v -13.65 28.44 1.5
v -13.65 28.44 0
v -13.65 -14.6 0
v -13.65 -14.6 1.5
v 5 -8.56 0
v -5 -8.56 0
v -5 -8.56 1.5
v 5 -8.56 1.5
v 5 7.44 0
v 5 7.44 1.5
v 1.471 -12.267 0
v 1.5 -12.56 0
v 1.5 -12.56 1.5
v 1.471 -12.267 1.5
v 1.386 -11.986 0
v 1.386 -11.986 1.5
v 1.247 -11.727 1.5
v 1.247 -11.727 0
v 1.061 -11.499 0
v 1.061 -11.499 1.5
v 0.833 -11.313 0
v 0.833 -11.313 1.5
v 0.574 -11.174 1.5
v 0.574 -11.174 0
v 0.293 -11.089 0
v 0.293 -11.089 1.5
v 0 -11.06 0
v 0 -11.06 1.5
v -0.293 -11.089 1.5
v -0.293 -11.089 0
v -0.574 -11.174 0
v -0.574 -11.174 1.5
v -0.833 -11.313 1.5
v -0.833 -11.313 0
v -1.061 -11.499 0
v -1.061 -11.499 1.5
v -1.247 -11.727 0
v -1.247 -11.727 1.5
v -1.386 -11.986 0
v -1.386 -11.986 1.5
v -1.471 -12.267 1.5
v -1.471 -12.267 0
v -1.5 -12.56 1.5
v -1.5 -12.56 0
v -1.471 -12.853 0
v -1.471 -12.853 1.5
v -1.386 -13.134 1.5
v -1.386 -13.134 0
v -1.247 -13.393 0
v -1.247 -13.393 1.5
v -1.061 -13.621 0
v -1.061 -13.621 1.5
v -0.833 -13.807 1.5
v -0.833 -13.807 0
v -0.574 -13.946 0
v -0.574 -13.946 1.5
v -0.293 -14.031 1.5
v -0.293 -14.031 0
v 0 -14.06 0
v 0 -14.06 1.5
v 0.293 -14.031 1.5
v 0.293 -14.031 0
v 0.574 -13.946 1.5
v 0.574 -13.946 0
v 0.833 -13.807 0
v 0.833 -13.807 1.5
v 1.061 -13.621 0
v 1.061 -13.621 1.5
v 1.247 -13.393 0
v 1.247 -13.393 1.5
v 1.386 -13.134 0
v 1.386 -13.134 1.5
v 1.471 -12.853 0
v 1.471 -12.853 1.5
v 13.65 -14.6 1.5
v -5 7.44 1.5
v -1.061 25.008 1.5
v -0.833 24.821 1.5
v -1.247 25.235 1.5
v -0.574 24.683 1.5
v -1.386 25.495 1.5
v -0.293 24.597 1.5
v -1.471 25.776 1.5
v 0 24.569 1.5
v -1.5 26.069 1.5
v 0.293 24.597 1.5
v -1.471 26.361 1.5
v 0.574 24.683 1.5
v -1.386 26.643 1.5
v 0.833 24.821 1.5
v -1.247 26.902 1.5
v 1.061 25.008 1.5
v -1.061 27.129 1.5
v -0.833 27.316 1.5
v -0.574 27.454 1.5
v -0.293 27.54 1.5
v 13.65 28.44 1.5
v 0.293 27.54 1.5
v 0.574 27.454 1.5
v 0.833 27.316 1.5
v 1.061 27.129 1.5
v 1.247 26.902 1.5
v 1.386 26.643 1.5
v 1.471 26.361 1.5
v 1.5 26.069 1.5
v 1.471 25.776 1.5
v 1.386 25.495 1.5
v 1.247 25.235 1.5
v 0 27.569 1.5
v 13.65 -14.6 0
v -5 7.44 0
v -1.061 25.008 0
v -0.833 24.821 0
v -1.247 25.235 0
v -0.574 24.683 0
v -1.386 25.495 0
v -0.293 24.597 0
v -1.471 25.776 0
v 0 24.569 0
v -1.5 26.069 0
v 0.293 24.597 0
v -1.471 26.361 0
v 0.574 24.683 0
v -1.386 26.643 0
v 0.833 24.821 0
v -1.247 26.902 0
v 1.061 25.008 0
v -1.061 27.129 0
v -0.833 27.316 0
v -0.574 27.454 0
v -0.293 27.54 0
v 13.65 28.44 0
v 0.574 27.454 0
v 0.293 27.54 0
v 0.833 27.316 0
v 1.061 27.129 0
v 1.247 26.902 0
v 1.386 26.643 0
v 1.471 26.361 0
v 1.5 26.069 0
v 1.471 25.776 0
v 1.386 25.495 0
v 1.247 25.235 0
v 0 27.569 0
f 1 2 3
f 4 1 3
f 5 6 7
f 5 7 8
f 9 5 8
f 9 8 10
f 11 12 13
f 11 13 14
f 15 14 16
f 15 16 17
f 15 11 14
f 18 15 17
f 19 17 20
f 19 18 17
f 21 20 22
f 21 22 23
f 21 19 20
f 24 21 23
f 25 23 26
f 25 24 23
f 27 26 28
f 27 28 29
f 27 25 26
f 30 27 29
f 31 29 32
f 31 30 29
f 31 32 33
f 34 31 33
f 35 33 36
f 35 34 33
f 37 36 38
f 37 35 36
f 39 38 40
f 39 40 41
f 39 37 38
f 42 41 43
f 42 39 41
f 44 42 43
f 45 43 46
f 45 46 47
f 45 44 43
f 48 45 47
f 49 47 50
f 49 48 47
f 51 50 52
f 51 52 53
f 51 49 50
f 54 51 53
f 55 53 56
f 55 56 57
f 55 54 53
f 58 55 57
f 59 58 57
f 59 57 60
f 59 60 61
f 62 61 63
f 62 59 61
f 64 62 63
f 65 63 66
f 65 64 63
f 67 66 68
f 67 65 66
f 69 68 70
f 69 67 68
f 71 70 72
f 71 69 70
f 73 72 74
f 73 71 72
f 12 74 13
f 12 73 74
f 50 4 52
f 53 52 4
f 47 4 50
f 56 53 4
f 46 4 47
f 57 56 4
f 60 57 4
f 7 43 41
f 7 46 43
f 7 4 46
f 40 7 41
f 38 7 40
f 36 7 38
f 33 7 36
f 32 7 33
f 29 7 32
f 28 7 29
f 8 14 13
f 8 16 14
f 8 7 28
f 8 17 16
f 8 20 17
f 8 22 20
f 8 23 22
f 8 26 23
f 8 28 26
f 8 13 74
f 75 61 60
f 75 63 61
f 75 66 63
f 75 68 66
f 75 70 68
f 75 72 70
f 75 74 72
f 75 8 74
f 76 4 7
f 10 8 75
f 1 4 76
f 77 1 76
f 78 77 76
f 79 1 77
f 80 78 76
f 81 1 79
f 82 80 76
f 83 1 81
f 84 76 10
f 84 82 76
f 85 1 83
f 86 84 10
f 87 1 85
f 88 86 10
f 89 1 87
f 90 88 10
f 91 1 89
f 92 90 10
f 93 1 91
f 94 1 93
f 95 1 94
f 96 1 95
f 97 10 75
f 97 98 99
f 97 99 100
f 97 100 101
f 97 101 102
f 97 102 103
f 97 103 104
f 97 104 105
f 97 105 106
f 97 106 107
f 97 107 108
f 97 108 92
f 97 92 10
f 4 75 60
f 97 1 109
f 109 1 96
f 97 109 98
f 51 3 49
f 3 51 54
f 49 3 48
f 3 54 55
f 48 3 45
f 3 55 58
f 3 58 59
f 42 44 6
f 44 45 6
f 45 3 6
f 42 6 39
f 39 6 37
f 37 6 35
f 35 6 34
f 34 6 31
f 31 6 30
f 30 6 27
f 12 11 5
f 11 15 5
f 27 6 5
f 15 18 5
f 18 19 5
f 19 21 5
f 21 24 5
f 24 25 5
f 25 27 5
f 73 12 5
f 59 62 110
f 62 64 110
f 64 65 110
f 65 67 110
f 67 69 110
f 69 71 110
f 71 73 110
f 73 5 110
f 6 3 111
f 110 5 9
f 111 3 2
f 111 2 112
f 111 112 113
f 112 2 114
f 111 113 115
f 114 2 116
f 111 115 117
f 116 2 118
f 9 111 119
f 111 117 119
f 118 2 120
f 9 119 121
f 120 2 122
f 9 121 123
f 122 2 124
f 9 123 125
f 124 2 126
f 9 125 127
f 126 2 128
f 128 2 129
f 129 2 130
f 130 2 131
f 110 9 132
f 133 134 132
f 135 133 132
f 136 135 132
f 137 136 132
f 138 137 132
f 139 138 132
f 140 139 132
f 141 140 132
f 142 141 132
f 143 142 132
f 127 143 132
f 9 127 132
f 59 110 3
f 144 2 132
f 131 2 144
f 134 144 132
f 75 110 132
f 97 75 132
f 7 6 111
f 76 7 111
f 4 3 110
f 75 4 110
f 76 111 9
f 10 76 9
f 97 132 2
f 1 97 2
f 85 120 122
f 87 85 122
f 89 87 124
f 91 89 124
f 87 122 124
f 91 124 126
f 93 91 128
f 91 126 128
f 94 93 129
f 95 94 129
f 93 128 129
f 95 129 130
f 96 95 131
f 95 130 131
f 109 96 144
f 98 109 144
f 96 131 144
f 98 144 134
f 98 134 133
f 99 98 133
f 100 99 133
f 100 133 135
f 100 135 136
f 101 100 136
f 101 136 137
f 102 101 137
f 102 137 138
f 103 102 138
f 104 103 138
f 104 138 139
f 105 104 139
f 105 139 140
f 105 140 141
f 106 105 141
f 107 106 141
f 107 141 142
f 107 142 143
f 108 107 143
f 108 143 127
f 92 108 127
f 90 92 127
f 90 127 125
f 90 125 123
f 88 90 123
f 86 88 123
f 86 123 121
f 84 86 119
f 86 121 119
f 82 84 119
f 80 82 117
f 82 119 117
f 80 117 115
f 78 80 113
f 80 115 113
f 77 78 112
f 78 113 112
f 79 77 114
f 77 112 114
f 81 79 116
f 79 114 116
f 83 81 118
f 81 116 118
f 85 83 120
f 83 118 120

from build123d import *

# Parameters (mm, degrees)
SKETCH_1_R          = 1.5
SKETCH_1_W          = 10
SKETCH_1_H          = 16
EXTRUDE_1_DEPTH     = 1.5
SKETCH_2_R          = 1.5
CUT_EXTRUDE_1_DEPTH = 10


with BuildPart() as part:
    # 草图1 → 凸台-拉伸1 (new body)
    # profile 1 of 2: a face of its own
    with BuildSketch(Plane.XY):
        Polygon((-13.65, 28.439884515), (-13.65, 14.6), (-13.65, -14.6), (13.65, -14.6), (13.65, 14.6), (13.65, 28.439884515), align=None)
        with Locations((0, -12.560115485)):
            Circle(SKETCH_1_R, mode=Mode.SUBTRACT)
        with Locations((0, -0.560115485)):
            Rectangle(SKETCH_1_W, SKETCH_1_H, mode=Mode.SUBTRACT)
    # profile 2 of 2: a face of its own
    with BuildSketch(Plane.XY):
        Polygon((-13.65, 28.439884515), (-13.65, 14.6), (-13.65, -14.6), (13.65, -14.6), (13.65, 14.6), (13.65, 28.439884515), align=None)
        with Locations((0, -12.560115485)):
            Circle(SKETCH_1_R, mode=Mode.SUBTRACT)
        with Locations((0, -0.560115485)):
            Rectangle(SKETCH_1_W, SKETCH_1_H, mode=Mode.SUBTRACT)
    extrude(amount=EXTRUDE_1_DEPTH)

    # 草图2 → 切除-拉伸1 (cut)
    with BuildSketch(Plane(origin=(0, 0, 0), x_dir=(-1, 0, 0), z_dir=(0, 0, -1))):
        with Locations((0, 26.068537202)):
            Circle(SKETCH_2_R)
    extrude(amount=-CUT_EXTRUDE_1_DEPTH, mode=Mode.SUBTRACT)


solid = part.part
